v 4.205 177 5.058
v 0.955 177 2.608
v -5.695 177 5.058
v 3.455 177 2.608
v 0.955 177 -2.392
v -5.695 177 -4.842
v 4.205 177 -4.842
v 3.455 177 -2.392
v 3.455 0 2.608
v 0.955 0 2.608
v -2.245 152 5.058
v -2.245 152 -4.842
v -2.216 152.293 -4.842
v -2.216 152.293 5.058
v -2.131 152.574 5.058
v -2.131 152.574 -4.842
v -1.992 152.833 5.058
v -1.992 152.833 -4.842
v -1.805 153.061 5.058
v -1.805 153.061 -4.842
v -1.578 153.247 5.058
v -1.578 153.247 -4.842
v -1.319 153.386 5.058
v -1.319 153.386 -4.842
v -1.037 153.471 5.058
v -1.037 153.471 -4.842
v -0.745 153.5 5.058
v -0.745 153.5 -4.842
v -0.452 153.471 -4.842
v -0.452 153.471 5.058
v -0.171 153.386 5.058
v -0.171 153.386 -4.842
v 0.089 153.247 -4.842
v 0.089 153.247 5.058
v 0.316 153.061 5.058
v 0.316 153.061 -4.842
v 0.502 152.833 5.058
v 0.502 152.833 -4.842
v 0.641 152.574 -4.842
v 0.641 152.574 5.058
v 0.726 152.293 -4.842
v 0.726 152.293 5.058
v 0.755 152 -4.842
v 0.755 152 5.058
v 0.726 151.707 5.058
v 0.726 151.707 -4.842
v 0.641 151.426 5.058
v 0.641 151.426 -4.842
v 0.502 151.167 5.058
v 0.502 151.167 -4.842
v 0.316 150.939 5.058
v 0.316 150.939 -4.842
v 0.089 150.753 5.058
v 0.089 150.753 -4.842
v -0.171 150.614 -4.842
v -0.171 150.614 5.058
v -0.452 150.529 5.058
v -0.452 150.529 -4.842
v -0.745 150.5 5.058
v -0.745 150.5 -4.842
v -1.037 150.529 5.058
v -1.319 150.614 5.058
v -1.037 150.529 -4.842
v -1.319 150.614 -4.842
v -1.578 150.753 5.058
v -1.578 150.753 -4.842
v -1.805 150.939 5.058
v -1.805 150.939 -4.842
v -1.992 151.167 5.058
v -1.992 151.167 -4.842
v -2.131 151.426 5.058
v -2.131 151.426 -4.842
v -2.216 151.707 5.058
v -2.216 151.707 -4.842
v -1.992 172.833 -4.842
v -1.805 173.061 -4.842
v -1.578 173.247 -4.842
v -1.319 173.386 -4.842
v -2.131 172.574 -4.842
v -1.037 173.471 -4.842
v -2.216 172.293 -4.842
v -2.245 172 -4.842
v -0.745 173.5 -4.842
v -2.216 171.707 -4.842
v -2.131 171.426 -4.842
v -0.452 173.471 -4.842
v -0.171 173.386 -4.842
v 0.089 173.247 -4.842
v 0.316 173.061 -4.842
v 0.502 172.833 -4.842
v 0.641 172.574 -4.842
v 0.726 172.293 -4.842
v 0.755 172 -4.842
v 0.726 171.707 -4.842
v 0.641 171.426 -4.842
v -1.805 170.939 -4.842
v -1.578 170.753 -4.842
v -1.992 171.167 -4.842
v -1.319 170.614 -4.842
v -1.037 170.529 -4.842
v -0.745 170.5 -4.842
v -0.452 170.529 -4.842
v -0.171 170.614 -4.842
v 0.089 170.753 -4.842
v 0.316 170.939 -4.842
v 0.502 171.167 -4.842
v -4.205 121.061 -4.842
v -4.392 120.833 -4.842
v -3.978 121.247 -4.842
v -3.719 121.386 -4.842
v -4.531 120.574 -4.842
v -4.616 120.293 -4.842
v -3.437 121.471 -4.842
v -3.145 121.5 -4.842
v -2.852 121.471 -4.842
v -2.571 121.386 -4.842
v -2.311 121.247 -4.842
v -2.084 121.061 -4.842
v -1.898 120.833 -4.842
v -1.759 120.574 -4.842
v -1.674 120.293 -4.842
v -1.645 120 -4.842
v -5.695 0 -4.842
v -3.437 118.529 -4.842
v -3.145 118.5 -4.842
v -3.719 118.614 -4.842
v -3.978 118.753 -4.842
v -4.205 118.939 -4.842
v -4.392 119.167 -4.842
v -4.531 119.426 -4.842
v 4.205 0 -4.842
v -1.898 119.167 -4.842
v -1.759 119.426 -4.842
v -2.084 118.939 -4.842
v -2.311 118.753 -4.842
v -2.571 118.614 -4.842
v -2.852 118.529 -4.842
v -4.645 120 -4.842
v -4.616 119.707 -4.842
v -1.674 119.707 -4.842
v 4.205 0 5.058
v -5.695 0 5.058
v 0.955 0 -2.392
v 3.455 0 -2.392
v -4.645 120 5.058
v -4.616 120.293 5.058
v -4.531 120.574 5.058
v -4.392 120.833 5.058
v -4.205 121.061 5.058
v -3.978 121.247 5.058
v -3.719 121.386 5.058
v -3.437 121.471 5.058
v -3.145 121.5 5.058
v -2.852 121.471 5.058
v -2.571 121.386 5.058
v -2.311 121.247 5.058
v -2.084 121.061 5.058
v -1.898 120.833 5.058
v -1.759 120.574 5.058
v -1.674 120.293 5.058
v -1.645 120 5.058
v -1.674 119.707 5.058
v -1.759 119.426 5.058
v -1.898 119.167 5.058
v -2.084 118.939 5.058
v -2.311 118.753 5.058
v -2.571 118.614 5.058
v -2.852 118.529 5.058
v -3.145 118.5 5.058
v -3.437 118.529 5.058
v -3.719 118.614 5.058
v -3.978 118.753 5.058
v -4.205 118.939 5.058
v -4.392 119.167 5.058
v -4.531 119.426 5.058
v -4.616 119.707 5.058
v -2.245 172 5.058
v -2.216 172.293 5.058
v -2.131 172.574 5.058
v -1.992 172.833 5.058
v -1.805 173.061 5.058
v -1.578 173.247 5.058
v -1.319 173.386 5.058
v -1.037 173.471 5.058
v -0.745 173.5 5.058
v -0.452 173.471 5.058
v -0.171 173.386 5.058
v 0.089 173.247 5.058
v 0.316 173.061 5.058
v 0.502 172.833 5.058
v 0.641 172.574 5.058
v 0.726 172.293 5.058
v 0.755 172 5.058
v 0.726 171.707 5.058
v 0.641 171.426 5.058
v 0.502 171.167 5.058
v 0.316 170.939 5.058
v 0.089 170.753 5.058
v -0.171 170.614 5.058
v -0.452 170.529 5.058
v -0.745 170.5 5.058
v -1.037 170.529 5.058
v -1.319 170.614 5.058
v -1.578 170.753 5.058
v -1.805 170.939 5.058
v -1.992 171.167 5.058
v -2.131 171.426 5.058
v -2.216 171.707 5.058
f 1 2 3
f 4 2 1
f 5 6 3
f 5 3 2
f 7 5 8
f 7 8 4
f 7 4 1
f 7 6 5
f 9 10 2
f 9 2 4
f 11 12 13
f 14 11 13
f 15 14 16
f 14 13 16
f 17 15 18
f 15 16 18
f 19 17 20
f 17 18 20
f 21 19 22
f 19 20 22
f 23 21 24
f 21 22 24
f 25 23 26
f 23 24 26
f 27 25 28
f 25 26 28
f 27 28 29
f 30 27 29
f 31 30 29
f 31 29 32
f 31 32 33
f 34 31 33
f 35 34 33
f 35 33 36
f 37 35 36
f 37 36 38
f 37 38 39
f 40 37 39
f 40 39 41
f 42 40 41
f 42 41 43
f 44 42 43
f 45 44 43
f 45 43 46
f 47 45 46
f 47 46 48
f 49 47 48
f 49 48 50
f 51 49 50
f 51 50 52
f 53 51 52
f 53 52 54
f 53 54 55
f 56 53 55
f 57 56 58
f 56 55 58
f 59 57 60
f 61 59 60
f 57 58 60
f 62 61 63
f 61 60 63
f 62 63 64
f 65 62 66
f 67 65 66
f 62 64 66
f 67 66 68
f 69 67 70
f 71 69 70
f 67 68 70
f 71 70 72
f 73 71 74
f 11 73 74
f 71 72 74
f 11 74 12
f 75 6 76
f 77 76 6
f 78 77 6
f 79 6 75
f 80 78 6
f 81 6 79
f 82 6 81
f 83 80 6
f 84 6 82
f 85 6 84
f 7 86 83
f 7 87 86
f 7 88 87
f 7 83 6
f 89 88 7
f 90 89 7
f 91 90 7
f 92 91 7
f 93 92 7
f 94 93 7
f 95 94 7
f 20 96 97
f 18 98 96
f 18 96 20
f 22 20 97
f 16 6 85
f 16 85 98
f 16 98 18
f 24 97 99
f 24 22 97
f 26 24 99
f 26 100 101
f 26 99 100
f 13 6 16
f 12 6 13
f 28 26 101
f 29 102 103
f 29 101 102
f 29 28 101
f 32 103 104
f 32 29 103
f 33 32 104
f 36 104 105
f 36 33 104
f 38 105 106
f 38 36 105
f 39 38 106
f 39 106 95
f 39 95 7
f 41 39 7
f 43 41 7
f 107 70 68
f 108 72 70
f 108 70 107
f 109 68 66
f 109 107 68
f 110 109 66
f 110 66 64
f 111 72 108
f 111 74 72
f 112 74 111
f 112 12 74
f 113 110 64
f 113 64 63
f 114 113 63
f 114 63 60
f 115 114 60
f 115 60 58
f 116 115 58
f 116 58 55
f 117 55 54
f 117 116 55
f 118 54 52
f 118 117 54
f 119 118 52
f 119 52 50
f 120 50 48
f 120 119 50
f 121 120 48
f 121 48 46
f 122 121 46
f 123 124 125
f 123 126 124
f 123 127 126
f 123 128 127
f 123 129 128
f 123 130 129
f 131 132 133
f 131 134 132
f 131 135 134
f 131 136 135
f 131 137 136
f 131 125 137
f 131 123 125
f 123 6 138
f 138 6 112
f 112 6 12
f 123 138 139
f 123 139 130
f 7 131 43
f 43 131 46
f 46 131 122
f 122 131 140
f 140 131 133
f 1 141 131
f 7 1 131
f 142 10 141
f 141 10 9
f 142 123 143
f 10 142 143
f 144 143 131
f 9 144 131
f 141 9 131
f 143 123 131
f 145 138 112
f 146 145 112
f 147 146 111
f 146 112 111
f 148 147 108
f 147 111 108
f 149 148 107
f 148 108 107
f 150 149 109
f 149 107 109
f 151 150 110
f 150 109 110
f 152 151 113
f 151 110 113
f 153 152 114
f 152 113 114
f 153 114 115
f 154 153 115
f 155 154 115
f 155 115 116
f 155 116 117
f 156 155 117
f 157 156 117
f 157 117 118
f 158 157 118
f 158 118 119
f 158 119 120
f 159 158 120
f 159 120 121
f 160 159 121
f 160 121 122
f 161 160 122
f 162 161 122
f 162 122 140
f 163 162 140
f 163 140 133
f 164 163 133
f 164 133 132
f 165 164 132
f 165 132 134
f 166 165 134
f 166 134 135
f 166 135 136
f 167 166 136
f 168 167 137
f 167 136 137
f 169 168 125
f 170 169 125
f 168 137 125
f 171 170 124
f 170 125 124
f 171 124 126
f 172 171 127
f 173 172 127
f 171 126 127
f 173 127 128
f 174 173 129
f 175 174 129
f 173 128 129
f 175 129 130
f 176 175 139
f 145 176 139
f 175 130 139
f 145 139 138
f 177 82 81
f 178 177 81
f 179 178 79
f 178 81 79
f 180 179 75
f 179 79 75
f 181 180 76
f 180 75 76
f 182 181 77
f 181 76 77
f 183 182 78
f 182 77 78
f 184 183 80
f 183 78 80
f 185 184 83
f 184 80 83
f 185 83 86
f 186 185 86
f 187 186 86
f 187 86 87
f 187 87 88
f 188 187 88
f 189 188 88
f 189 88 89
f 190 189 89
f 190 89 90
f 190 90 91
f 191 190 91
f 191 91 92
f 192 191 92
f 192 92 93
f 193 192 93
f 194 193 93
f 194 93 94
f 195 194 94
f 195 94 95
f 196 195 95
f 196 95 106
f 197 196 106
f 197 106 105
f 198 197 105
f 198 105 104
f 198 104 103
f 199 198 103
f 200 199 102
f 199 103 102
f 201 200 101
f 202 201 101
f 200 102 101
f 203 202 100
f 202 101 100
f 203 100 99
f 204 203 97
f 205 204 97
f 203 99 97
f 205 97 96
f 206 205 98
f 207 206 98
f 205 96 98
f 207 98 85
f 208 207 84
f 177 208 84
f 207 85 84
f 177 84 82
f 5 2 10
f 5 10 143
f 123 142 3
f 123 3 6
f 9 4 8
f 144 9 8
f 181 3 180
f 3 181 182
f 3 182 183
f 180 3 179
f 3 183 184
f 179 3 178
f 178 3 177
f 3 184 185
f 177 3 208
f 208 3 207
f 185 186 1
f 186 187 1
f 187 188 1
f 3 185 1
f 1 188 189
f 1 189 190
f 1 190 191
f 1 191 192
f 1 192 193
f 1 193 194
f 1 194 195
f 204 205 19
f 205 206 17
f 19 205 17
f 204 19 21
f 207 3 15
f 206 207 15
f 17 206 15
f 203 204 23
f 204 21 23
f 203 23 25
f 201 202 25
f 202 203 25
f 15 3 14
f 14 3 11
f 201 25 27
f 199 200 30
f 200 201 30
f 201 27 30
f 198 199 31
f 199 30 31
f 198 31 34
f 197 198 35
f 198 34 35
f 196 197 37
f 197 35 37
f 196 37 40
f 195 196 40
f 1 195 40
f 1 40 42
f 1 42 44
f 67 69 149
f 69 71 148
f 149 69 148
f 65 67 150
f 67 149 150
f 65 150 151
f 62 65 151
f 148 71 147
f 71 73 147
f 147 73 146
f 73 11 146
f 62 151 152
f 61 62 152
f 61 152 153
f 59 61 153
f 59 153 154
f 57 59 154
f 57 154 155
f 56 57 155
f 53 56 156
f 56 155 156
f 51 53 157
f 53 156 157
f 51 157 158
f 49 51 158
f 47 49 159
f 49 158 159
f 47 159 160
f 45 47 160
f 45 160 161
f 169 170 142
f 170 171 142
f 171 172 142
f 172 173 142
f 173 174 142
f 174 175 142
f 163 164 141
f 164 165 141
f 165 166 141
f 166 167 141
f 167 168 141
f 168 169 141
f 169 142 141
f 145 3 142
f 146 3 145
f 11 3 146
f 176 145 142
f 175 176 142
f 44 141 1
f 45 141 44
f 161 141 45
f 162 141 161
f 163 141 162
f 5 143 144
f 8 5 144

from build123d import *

# Parameters (mm, degrees)
SKETCH_1_W         = 9.9
SKETCH_1_H         = 9.9
SKETCH_1_W_2       = 2.5
SKETCH_1_H_2       = 5
EXTRUDE_1_DEPTH    = 177
SKETCH2_R          = 1.5
CUT_EXTRUDE2_DEPTH = 10.9


with BuildPart() as part:
    # Эскиз1 → Бобышка-Вытянуть1 (new body)
    with BuildSketch(Plane(origin=(0, 0, 0), x_dir=(1, 0, 0), z_dir=(0, 1, 0))):
        with Locations((-0.744758221, -0.10825854)):
            Rectangle(SKETCH_1_W, SKETCH_1_H)
        with Locations((2.205241779, -0.10825854)):
            Rectangle(SKETCH_1_W_2, SKETCH_1_H_2, mode=Mode.SUBTRACT)
    extrude(amount=EXTRUDE_1_DEPTH)

    # Sketch2 → Cut-Extrude2 (cut, through all)
    with BuildSketch(Plane(origin=(0, 0, -4.84174146), x_dir=(-1, 0, 0), z_dir=(0, 0, -1))):
        with Locations((0.744758221, 172)):
            Circle(SKETCH2_R)
        with Locations((3.144758221, 120)):
            Circle(SKETCH2_R)
        with Locations((0.744758221, 152)):
            Circle(SKETCH2_R)
    extrude(amount=-CUT_EXTRUDE2_DEPTH, mode=Mode.SUBTRACT)


solid = part.part
